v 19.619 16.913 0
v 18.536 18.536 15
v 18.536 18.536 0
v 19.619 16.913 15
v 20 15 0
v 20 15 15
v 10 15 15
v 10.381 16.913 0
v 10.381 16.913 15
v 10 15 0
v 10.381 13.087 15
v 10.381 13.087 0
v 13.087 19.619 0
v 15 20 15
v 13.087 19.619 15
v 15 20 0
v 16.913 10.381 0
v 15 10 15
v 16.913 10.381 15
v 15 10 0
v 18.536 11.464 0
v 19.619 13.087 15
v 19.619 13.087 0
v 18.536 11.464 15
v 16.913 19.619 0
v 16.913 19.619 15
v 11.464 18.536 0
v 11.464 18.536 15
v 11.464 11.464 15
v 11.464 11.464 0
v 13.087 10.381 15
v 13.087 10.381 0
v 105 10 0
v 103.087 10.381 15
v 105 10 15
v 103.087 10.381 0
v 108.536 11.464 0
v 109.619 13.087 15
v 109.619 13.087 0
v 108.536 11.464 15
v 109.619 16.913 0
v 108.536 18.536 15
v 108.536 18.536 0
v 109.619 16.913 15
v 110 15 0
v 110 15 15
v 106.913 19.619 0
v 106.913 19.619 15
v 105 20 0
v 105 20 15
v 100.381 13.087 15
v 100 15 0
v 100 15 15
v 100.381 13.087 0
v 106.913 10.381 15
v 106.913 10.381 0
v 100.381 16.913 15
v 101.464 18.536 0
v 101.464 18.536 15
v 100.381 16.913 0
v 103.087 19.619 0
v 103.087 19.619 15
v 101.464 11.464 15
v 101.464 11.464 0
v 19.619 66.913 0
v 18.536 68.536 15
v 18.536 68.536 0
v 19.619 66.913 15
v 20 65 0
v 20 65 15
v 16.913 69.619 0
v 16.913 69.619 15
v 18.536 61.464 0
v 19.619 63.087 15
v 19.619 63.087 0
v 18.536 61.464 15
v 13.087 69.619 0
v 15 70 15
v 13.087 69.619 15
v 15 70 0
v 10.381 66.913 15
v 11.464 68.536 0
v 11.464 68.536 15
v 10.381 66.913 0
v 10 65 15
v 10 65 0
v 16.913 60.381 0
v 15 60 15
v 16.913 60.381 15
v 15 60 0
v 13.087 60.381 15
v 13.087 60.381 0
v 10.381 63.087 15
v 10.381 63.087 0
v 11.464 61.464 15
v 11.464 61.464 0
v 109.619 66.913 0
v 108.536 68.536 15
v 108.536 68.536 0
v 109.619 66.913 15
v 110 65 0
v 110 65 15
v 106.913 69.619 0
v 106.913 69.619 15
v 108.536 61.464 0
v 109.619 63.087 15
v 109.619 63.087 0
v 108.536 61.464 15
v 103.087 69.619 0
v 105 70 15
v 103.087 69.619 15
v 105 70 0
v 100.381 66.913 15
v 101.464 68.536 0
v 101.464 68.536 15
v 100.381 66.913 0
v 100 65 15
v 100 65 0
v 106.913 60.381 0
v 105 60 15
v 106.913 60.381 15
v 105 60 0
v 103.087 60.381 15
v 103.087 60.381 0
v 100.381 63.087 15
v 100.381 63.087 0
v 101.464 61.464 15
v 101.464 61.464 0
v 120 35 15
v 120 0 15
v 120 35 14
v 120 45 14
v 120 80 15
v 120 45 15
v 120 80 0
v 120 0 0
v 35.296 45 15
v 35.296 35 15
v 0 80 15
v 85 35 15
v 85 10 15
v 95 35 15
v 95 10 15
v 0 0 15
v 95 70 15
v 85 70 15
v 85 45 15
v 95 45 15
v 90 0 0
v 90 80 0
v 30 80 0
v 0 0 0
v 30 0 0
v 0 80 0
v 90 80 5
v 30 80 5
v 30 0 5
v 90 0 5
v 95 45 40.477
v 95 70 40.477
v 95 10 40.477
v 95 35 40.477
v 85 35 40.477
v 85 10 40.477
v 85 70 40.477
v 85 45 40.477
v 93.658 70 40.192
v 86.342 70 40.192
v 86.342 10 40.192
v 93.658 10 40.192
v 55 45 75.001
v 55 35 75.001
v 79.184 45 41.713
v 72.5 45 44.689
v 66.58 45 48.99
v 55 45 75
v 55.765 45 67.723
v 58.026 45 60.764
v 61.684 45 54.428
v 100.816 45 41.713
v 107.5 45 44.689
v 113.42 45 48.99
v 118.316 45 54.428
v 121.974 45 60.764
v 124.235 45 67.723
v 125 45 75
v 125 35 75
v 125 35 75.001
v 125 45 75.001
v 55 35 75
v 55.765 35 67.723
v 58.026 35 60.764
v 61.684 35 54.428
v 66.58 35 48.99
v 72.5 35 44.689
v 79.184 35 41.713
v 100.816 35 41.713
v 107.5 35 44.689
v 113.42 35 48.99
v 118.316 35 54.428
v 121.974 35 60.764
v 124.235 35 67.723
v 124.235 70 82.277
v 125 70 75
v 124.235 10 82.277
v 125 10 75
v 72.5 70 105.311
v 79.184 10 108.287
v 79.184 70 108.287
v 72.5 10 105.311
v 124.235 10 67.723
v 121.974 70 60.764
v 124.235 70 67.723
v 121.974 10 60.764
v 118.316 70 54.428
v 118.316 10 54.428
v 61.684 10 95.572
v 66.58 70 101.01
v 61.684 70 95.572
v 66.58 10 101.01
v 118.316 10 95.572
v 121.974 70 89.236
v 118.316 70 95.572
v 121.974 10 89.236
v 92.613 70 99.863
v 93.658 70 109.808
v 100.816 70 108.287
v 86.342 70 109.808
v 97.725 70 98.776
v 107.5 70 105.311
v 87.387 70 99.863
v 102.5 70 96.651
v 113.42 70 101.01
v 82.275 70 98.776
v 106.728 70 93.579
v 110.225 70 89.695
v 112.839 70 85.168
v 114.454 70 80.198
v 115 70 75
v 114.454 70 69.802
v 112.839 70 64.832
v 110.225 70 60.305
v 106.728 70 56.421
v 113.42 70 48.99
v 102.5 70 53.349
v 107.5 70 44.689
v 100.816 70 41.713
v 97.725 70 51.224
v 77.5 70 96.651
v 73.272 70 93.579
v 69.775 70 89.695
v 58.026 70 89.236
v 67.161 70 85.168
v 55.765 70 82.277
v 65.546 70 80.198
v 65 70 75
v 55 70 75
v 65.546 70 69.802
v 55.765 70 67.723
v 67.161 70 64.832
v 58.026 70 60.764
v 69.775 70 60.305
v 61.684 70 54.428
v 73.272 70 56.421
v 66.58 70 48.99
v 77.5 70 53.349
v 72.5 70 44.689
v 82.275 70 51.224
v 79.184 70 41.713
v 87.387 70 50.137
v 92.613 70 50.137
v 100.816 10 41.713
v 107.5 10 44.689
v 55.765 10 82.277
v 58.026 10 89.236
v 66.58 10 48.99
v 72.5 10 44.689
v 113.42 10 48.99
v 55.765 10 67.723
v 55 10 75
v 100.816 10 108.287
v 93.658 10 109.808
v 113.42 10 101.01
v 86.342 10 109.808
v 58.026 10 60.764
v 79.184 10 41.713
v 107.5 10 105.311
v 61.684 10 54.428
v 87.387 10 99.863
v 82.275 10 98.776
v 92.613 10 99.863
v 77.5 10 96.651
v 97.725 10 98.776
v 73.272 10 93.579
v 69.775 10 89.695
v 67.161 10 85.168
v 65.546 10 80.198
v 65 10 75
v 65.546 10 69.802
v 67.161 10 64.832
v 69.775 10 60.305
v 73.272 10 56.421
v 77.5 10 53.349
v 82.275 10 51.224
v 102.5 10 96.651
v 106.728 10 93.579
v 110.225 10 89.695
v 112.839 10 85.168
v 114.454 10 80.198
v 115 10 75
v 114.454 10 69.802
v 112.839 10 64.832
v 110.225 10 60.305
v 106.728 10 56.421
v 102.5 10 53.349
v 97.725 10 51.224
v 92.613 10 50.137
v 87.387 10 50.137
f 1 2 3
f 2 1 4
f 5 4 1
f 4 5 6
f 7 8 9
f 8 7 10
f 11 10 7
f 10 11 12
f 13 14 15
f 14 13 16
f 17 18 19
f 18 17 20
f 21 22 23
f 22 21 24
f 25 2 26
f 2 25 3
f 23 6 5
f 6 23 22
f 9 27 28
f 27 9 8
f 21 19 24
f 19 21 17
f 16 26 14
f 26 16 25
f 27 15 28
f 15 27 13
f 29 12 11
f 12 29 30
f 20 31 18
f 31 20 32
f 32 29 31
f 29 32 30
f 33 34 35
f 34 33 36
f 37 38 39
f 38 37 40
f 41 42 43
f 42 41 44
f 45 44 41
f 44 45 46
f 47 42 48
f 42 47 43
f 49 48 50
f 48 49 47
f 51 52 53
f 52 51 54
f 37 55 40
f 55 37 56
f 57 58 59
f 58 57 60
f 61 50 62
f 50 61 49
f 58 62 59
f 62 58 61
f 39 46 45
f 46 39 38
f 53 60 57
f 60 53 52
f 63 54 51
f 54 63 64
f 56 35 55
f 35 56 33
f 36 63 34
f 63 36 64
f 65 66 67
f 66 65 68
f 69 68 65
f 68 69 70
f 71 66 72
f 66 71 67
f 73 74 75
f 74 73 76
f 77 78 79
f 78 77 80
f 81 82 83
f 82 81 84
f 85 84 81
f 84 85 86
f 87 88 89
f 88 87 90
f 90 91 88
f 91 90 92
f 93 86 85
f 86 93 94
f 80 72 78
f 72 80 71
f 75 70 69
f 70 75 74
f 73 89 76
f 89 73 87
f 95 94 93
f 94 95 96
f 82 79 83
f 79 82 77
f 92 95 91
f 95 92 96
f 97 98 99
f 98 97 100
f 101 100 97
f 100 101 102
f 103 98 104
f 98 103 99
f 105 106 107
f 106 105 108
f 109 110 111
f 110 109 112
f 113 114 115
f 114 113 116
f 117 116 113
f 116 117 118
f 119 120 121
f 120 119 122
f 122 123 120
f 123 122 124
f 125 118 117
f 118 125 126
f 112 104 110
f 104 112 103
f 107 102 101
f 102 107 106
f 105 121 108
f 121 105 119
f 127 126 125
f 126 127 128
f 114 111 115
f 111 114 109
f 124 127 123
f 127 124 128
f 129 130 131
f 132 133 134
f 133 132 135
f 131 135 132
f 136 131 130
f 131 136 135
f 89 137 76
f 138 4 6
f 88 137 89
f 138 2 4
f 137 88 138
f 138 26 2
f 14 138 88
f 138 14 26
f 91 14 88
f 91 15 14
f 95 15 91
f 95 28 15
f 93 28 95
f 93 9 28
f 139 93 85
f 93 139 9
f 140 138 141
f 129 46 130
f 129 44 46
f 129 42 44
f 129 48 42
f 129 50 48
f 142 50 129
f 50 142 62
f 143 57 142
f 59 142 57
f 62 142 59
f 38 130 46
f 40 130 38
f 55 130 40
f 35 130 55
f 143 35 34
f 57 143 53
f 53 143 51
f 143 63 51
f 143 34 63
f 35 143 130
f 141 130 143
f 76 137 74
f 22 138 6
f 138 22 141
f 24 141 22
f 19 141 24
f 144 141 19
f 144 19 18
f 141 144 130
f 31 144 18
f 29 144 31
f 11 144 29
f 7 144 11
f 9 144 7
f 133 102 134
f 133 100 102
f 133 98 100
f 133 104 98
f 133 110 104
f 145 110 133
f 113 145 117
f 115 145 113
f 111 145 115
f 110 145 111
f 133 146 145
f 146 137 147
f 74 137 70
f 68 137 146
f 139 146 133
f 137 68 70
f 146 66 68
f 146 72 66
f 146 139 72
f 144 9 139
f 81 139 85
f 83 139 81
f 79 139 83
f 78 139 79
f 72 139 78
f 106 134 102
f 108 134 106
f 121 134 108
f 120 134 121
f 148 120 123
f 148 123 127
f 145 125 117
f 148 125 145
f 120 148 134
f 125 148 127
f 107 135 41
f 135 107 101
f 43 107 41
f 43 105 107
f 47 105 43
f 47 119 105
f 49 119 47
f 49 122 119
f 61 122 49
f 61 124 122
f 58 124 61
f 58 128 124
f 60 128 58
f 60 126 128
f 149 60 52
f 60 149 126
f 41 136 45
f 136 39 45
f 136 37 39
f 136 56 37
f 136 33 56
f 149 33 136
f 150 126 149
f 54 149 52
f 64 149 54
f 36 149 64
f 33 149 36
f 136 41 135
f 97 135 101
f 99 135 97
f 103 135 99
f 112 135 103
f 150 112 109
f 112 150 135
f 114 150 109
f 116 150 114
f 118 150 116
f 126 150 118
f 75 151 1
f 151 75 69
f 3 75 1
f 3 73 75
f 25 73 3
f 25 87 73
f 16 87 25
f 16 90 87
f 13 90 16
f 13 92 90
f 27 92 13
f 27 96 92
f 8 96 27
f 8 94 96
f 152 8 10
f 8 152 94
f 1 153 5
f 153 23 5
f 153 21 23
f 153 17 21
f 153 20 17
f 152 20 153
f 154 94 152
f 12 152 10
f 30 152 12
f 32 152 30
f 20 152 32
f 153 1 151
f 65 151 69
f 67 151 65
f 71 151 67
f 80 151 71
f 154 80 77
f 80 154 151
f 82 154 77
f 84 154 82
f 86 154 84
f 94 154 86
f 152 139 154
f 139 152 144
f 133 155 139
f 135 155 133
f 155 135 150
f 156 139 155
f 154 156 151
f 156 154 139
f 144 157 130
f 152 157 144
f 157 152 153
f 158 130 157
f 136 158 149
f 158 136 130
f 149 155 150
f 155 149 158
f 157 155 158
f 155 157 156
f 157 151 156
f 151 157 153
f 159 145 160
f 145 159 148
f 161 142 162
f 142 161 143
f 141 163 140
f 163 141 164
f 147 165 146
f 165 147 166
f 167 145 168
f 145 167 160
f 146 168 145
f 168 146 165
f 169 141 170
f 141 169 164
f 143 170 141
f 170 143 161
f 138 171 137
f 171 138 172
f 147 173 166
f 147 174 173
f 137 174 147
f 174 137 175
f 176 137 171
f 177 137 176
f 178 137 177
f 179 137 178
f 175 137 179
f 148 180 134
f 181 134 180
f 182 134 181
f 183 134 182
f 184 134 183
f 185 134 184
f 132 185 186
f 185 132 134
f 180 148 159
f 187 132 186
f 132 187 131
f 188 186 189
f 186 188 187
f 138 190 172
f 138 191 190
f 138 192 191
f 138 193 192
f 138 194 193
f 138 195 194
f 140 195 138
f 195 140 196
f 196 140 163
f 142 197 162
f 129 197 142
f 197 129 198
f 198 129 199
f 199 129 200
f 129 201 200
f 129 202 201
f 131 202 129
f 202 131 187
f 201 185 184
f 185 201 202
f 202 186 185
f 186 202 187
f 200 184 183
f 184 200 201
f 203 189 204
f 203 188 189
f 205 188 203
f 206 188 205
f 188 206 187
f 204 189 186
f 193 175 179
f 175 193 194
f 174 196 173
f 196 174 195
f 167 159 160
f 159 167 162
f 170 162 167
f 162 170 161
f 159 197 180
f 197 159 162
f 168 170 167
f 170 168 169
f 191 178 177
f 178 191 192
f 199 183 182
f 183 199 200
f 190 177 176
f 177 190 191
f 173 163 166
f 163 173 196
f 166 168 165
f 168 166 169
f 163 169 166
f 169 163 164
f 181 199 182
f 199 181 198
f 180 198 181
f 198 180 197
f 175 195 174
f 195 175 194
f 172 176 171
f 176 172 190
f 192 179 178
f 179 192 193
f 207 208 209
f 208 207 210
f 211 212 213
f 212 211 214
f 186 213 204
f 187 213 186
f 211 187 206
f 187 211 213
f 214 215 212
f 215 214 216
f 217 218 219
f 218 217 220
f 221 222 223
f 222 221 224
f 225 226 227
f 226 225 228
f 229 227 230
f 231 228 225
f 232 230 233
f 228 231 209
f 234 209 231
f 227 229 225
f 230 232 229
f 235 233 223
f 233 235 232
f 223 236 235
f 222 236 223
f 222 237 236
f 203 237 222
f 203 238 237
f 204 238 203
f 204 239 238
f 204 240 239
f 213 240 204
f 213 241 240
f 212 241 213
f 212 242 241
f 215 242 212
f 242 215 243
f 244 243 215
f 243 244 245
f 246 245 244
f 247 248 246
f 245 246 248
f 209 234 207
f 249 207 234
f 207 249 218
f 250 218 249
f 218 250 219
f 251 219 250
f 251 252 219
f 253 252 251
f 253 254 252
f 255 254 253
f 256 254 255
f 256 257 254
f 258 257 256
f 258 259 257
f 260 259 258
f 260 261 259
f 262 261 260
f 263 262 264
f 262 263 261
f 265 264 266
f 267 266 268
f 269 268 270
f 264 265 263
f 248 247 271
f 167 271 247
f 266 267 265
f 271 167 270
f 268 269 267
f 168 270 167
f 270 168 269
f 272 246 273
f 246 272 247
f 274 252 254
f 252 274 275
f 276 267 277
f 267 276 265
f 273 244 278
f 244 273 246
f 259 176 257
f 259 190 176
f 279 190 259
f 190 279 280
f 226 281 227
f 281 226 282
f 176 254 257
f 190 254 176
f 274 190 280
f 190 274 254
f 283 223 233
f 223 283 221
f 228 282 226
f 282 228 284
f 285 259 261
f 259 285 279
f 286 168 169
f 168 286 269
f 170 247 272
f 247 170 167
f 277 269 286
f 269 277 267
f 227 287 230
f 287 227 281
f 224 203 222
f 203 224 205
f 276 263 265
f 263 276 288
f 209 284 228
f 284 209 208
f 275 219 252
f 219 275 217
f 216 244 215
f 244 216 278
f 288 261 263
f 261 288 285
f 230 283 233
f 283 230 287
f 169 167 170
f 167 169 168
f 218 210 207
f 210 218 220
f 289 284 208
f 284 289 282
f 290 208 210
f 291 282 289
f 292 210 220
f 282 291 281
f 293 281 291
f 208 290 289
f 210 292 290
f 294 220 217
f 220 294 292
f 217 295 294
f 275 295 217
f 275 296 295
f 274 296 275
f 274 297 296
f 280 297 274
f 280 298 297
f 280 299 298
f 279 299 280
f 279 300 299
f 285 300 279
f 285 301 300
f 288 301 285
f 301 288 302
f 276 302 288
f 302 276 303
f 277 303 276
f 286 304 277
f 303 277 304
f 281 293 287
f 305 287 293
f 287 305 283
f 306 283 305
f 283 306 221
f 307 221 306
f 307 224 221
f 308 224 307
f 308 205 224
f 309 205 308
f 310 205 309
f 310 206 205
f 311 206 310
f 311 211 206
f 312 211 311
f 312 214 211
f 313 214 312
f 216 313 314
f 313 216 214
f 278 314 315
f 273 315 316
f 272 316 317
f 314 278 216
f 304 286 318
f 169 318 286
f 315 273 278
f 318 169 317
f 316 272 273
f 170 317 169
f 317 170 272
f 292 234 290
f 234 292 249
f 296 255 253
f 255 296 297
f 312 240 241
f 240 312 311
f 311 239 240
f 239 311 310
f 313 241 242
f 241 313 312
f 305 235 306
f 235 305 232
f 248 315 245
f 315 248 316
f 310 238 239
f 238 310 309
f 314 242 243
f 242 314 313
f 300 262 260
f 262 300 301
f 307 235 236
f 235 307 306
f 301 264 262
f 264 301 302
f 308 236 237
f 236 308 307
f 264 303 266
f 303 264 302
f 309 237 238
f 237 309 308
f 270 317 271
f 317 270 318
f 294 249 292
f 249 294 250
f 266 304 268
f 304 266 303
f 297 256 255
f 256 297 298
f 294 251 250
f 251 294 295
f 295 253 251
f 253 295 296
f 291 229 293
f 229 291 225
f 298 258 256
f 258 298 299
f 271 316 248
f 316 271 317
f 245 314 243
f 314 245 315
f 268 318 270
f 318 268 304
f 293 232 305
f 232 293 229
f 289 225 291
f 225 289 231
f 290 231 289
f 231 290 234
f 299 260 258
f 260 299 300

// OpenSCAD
difference() {
    cube([120, 80, 15]);

    translate([30,-1,-1])
    cube([60, 82, 6]);

    translate([15, 15, -1]) {
        for(j=[0:1]) {
            for(i=[0:1]) {
                translate([i*90, j*50,0])
                cylinder(d=10, h=17);
            }
        }   
    }
}

difference() {
    union() {
        translate([120-35,10,15])
        cube([10, 60, 60]);
        
        hull() {
        translate([35,40-5,14])
        cube([120-35, 10, 0.1]);

        translate([120-30-35,40-5,60+15])
        cube([70, 10, 0.001]);
        }
    }
    translate([120-30,10,60+15])
    rotate([-90,0,0])
    translate([0,0,-1])
    cylinder(d=70, h=62);

}

translate([120-30,10,60+15])
rotate([-90,0,0]) {
    difference() {
        cylinder(d=70, h=60);
        translate([0,0,-1])
        cylinder(d=50, h=62);
    }
}
